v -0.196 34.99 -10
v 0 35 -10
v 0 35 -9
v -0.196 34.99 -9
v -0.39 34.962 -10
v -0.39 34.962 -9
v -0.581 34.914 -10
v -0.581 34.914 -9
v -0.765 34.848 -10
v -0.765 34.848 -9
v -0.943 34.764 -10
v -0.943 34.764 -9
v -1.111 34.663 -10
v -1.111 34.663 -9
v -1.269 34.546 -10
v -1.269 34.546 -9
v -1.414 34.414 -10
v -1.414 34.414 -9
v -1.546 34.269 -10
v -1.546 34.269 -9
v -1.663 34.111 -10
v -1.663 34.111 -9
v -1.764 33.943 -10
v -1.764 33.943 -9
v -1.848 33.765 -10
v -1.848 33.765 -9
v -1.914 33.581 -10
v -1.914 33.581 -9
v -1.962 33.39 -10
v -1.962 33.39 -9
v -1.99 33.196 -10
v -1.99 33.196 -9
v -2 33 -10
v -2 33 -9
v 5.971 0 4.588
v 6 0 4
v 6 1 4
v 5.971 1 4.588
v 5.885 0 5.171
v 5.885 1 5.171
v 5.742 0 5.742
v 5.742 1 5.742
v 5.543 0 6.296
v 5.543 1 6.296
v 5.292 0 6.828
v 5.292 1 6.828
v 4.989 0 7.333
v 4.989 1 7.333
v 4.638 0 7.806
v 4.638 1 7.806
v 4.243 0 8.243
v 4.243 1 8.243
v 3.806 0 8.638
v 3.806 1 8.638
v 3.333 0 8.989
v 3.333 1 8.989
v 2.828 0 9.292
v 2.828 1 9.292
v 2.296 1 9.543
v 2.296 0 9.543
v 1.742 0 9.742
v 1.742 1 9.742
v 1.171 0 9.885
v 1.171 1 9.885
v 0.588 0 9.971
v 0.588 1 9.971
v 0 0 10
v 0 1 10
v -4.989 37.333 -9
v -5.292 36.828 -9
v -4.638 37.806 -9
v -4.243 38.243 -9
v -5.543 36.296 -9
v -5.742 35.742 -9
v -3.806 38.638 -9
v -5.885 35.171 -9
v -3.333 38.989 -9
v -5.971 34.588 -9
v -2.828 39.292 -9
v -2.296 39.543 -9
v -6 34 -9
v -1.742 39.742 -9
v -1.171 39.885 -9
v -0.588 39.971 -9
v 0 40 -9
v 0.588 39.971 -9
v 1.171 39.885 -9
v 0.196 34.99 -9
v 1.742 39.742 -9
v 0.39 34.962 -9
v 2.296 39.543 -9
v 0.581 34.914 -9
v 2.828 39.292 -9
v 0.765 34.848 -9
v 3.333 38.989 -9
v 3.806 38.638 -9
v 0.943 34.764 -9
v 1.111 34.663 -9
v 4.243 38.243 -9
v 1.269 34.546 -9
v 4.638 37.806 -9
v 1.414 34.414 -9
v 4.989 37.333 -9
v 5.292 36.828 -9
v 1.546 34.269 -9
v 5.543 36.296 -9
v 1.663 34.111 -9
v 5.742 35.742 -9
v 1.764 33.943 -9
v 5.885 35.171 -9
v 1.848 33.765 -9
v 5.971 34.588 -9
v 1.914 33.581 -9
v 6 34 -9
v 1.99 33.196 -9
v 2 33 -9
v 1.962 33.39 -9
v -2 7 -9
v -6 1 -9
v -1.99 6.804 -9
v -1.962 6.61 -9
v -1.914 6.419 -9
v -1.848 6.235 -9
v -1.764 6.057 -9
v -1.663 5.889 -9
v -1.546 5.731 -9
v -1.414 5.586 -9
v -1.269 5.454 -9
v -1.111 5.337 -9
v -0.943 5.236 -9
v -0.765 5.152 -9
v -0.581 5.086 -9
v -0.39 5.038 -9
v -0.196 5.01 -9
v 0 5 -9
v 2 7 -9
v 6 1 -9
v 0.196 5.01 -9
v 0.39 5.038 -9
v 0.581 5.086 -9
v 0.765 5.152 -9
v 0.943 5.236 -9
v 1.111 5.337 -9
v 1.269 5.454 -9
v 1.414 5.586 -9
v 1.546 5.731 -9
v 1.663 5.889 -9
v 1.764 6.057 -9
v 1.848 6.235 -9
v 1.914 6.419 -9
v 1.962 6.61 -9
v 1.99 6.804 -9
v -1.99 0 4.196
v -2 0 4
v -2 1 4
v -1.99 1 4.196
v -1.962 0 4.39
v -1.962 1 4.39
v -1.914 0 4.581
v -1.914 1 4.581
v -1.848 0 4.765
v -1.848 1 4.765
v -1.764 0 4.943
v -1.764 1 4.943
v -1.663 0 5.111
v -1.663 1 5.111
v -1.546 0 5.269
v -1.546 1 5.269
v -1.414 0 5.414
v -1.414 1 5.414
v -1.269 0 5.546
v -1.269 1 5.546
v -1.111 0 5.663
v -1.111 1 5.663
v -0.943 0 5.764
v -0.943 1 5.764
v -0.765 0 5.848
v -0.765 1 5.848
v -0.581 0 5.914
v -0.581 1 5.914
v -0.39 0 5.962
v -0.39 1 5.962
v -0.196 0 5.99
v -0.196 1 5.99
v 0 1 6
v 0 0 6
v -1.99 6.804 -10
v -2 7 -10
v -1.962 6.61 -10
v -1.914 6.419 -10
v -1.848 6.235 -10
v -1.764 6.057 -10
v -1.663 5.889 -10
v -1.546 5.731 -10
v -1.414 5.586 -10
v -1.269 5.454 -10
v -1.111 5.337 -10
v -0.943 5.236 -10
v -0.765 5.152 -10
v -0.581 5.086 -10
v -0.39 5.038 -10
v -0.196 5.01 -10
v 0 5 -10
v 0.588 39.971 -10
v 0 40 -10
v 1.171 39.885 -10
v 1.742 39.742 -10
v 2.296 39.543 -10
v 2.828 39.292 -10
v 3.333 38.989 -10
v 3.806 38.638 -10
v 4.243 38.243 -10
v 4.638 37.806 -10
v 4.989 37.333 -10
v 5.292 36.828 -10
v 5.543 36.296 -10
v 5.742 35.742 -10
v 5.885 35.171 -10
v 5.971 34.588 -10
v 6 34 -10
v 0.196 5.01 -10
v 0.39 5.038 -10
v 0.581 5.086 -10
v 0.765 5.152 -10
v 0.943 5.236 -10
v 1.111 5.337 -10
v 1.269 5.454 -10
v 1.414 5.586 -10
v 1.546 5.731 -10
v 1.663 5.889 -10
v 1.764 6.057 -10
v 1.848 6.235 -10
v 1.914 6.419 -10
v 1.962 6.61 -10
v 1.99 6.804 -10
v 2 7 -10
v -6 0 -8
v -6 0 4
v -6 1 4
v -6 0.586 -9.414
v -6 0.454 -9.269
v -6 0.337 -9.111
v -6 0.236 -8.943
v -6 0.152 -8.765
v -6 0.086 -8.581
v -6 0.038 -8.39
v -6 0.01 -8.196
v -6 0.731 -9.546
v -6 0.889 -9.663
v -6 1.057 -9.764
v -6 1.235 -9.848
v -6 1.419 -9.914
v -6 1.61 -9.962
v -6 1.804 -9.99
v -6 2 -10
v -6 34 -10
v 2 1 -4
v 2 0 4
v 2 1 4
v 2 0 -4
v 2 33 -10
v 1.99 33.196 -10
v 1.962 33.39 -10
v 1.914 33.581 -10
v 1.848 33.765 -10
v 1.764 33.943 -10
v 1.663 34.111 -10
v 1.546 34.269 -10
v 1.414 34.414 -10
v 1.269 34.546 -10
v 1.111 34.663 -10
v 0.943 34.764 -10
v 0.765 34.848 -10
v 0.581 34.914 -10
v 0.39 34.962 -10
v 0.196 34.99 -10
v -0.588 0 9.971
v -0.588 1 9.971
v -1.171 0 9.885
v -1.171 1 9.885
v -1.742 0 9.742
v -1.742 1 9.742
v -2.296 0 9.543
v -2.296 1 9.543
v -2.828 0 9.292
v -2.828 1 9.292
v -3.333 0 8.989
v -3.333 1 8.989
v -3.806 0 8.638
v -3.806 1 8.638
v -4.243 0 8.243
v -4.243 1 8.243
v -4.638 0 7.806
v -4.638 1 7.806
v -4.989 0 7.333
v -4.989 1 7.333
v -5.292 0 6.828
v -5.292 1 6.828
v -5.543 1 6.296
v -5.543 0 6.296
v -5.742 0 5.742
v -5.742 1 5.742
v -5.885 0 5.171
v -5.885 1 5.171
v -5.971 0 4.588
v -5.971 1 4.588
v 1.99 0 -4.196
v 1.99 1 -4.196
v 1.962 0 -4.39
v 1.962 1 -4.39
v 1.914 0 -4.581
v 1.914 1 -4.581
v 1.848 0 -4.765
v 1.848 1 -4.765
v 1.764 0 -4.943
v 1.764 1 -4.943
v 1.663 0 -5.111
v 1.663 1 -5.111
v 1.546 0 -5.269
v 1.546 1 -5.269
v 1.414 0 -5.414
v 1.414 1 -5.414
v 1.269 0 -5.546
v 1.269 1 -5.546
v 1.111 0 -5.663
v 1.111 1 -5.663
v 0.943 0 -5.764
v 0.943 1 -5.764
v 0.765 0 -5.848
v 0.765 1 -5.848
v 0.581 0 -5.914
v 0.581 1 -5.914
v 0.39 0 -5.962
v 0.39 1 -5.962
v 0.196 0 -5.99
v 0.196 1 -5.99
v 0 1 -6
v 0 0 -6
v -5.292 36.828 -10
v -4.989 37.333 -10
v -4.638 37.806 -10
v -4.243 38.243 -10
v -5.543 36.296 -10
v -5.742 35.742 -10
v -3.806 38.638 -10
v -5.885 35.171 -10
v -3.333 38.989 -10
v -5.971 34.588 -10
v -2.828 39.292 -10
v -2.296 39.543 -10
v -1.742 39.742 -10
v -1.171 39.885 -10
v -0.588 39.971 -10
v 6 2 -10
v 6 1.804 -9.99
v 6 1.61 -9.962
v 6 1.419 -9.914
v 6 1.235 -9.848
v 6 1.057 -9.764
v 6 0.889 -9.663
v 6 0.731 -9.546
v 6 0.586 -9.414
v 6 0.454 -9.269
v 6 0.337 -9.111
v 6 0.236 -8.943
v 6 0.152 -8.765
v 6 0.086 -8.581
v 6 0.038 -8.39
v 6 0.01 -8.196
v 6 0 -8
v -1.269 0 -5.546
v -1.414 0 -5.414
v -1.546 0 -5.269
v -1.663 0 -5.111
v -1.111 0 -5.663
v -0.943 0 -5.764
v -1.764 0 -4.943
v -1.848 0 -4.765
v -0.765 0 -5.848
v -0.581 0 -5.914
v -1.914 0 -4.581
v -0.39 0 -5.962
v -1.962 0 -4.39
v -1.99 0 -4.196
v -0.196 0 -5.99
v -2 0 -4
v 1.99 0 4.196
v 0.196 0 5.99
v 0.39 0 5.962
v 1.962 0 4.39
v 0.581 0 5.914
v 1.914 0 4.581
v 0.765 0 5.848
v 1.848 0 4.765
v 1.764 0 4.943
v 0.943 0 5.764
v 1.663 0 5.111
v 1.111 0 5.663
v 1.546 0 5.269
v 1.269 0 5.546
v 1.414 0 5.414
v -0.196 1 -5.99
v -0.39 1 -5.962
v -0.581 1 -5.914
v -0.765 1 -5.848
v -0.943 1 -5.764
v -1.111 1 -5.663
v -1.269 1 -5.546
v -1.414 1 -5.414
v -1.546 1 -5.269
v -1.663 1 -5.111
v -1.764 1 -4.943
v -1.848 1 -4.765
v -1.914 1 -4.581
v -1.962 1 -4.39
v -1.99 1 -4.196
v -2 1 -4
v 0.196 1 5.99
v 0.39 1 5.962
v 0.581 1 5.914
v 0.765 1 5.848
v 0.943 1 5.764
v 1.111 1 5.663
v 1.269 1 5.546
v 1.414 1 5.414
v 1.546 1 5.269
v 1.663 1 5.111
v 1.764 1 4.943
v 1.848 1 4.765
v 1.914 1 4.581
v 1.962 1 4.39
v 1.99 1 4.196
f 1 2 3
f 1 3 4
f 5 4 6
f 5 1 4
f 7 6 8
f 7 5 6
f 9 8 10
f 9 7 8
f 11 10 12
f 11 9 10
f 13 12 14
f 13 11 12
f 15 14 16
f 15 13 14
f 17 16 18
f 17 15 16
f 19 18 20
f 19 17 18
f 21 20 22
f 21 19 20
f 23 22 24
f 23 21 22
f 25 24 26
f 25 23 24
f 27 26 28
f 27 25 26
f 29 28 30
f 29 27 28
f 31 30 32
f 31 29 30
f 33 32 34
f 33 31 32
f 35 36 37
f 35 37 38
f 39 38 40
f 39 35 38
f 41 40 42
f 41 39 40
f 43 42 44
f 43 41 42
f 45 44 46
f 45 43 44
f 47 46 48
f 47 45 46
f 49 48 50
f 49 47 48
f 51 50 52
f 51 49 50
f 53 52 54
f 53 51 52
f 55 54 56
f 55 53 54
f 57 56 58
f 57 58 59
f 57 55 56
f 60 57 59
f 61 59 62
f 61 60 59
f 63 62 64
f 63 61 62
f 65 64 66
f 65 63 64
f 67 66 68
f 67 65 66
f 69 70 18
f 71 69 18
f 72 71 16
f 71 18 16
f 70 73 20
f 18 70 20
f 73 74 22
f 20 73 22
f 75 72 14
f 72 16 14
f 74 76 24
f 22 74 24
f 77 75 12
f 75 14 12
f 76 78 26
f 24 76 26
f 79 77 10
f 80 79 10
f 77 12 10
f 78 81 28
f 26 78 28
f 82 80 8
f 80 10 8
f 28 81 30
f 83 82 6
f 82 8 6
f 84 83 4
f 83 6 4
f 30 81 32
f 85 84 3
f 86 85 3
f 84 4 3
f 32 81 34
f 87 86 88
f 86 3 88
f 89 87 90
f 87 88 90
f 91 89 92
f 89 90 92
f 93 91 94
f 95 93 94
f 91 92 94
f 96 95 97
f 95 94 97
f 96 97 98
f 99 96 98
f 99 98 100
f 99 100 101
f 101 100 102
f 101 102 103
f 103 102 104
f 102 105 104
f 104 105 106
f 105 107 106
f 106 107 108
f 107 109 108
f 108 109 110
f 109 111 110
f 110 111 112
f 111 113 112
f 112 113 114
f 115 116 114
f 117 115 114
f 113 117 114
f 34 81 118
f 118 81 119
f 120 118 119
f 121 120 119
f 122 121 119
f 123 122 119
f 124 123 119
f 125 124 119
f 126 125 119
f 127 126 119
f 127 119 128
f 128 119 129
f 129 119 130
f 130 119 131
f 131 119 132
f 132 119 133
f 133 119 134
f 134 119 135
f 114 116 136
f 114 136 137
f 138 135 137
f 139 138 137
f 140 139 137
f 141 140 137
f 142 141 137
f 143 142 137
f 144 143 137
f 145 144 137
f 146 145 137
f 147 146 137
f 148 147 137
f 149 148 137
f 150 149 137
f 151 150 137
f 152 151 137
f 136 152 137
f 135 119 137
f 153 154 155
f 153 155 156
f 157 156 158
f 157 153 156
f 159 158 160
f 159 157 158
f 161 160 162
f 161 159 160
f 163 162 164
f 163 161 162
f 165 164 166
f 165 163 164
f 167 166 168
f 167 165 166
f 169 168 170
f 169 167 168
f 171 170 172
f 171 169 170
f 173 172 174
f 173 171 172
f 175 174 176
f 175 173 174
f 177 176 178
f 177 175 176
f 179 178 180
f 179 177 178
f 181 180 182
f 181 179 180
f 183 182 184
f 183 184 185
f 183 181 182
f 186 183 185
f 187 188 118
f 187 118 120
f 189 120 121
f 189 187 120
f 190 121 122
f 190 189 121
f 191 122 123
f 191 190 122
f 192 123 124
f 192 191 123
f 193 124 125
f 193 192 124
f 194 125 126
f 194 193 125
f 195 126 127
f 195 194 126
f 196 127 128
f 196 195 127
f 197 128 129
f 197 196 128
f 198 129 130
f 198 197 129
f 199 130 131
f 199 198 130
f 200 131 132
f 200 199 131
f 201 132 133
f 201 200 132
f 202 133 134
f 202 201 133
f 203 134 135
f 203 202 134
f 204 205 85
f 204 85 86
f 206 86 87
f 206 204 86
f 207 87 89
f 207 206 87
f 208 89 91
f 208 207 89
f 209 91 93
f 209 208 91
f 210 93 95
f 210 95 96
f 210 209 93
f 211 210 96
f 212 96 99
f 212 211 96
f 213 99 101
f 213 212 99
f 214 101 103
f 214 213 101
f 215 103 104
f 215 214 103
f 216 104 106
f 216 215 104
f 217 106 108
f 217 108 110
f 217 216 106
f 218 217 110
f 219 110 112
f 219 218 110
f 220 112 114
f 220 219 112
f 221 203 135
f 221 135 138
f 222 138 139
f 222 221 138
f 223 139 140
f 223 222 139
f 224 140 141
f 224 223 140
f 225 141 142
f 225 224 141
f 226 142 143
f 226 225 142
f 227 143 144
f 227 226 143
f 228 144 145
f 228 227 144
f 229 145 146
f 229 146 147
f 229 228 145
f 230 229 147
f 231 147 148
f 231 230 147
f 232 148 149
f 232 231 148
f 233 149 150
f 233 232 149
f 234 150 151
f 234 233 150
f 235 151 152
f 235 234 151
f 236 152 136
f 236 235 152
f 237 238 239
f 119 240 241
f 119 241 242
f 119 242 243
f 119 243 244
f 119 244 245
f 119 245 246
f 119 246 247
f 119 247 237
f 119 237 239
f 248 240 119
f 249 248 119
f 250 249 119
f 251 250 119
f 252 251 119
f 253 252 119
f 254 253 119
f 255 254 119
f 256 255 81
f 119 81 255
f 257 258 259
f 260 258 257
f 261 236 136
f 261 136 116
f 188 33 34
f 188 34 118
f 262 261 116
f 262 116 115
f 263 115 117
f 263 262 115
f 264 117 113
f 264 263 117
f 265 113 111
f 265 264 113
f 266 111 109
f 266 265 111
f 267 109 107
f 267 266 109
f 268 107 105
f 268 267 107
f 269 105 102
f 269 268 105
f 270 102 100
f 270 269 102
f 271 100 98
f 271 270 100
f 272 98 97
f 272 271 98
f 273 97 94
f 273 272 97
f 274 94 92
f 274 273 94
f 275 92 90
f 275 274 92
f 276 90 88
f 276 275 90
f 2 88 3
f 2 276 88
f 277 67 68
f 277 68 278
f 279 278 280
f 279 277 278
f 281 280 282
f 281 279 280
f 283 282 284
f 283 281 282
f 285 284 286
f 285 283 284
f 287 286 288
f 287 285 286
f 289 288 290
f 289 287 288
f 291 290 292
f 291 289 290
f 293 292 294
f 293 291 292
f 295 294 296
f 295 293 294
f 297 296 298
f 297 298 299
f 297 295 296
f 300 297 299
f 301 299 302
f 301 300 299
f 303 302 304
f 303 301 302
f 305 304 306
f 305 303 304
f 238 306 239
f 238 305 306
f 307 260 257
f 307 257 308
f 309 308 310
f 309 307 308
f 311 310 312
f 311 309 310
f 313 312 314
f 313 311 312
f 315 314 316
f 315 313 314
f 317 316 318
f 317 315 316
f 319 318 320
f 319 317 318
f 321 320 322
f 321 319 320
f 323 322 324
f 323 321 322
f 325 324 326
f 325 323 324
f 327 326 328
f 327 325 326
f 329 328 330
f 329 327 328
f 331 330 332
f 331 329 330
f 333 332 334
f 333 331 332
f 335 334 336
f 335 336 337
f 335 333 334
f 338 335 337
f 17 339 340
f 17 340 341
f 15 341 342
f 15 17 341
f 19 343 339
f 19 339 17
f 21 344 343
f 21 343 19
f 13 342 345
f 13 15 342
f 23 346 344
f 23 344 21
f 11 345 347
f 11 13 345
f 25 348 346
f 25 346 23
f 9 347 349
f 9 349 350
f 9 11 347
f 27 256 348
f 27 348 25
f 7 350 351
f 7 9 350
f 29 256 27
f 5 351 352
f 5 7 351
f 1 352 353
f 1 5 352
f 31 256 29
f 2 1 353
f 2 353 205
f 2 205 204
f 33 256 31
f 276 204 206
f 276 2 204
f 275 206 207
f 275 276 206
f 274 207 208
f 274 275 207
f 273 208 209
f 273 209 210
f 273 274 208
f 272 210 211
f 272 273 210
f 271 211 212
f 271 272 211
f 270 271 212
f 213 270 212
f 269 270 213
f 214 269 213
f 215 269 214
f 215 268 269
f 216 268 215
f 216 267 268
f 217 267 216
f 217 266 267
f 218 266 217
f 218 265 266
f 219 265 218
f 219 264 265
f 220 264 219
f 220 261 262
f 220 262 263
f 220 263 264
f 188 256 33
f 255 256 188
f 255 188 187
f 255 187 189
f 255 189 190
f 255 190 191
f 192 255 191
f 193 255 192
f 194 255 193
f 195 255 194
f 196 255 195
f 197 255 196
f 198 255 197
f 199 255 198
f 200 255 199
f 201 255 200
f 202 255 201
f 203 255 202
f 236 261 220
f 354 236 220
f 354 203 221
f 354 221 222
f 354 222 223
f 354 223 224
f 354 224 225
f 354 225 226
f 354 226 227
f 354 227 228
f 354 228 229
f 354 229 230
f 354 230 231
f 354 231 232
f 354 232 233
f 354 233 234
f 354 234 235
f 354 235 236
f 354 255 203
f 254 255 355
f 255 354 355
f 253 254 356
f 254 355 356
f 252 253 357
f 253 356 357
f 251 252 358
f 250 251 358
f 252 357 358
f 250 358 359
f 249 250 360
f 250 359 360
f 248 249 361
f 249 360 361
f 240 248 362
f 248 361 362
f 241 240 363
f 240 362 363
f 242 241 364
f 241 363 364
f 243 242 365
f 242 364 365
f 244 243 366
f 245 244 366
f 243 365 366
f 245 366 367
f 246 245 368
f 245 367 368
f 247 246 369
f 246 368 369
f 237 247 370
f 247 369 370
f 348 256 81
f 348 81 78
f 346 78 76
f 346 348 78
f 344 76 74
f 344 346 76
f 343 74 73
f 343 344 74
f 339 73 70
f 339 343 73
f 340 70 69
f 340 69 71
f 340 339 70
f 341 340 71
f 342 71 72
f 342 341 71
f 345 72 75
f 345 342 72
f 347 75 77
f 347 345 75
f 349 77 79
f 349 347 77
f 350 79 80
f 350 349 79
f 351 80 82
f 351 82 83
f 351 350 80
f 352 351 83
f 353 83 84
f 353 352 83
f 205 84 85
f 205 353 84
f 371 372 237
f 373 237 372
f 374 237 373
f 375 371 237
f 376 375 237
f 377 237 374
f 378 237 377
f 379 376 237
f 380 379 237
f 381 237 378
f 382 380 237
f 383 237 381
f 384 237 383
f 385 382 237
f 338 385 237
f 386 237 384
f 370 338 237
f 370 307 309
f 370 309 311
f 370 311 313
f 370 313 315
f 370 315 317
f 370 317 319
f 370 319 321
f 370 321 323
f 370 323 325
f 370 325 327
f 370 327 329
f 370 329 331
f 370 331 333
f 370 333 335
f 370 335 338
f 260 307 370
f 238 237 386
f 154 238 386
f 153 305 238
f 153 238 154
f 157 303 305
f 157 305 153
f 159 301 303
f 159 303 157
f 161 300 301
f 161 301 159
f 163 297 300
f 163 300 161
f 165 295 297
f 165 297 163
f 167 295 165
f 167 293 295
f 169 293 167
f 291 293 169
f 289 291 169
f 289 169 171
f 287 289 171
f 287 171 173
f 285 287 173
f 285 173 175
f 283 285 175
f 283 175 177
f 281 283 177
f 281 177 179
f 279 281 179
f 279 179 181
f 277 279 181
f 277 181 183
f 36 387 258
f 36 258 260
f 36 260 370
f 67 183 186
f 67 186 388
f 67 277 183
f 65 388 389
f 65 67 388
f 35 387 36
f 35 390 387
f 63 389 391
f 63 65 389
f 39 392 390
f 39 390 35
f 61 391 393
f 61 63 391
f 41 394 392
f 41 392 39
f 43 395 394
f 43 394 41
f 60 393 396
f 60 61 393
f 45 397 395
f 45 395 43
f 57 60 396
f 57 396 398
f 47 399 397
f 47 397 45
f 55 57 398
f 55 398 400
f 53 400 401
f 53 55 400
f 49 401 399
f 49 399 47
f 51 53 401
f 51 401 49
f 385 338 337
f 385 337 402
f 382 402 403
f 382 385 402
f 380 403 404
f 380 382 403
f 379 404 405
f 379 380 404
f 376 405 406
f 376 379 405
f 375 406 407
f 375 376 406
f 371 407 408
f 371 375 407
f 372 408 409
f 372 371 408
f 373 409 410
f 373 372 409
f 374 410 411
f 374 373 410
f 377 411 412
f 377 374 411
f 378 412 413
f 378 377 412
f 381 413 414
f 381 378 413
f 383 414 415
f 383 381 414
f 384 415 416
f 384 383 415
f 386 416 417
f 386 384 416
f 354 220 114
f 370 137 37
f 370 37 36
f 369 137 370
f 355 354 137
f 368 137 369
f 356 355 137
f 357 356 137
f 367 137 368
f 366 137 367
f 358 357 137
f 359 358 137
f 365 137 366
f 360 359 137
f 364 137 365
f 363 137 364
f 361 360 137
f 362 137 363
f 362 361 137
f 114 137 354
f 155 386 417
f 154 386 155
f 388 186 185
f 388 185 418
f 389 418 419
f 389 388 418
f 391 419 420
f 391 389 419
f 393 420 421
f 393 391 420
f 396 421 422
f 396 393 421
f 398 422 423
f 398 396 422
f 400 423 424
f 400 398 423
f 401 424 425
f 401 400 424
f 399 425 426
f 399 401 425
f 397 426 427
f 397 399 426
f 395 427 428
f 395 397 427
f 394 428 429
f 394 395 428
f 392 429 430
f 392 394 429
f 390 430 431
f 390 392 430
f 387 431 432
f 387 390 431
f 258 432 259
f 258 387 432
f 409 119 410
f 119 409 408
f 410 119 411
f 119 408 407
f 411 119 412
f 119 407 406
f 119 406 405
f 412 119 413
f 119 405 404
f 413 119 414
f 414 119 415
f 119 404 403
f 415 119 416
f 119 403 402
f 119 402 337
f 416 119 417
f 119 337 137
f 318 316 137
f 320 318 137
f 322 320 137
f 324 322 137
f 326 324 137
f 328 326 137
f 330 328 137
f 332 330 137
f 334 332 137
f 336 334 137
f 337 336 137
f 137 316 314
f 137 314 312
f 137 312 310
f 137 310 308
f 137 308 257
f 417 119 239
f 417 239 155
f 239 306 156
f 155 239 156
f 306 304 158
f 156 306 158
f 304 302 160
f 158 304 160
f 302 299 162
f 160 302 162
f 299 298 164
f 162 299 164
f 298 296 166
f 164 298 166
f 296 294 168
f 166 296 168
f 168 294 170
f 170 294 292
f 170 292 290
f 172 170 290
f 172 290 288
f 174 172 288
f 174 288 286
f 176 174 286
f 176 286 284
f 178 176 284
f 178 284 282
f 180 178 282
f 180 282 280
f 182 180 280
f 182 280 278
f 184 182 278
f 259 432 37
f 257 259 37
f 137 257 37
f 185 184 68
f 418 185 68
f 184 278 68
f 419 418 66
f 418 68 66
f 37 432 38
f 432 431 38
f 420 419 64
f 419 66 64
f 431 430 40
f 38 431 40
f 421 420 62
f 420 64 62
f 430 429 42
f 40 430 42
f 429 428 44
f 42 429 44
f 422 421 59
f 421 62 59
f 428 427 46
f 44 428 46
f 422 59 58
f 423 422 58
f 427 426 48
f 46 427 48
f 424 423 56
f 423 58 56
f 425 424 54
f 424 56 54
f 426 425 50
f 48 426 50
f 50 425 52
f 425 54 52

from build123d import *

# Parameters (mm, degrees)
F1_DEPTH = 1
F3_DEPTH = 1
F4_R     = 2


with BuildPart() as f1:
    # F0 (on Front) → F1 (new body)
    with BuildSketch(Plane.XZ):
        with BuildLine():
            Line((-6, -10), (6, -10))
            Line((6, -10), (6, 4))
            ThreePointArc((6, 4), (4.242641, 8.242641), (0, 10))
            ThreePointArc((0, 10), (-4.242641, 8.242641), (-6, 4))
            Line((-6, 4), (-6, -10))
        make_face()
        with BuildLine():
            Line((2, 4), (2, -4))
            ThreePointArc((2, -4), (1.414214, -5.414214), (0, -6))
            ThreePointArc((0, -6), (-1.414214, -5.414214), (-2, -4))
            Line((-2, -4), (-2, 4))
            ThreePointArc((-2, 4), (-1.414214, 5.414214), (0, 6))
            ThreePointArc((0, 6), (1.414214, 5.414214), (2, 4))
        make_face(mode=Mode.SUBTRACT)
    extrude(amount=-F1_DEPTH)

    # F2 (on face) → F3 (join)
    with BuildSketch(Plane(origin=(0, 0, -10), x_dir=(1, 0, 0), z_dir=(0, 0, -1))):
        with BuildLine():
            Line((6, -1), (-6, -1))
            Line((-6, -1), (-6, -34))
            ThreePointArc((-6, -34), (-4.242641, -38.242641), (0, -40))
            ThreePointArc((0, -40), (4.242641, -38.242641), (6, -34))
            Line((6, -34), (6, -1))
        make_face()
        with BuildLine():
            Line((2, -7), (2, -33))
            ThreePointArc((2, -33), (1.414214, -34.414214), (0, -35))
            ThreePointArc((0, -35), (-1.414214, -34.414214), (-2, -33))
            Line((-2, -33), (-2, -7))
            ThreePointArc((-2, -7), (-1.414214, -5.585786), (0, -5))
            ThreePointArc((0, -5), (1.414214, -5.585786), (2, -7))
        make_face(mode=Mode.SUBTRACT)
    extrude(amount=-F3_DEPTH)

    # F4
    f4_edges = [f1.edges().sort_by_distance(p)[0] for p in [
        (0, 0, -10),
    ]]
    fillet(f4_edges, radius=F4_R)


solid = f1.part
